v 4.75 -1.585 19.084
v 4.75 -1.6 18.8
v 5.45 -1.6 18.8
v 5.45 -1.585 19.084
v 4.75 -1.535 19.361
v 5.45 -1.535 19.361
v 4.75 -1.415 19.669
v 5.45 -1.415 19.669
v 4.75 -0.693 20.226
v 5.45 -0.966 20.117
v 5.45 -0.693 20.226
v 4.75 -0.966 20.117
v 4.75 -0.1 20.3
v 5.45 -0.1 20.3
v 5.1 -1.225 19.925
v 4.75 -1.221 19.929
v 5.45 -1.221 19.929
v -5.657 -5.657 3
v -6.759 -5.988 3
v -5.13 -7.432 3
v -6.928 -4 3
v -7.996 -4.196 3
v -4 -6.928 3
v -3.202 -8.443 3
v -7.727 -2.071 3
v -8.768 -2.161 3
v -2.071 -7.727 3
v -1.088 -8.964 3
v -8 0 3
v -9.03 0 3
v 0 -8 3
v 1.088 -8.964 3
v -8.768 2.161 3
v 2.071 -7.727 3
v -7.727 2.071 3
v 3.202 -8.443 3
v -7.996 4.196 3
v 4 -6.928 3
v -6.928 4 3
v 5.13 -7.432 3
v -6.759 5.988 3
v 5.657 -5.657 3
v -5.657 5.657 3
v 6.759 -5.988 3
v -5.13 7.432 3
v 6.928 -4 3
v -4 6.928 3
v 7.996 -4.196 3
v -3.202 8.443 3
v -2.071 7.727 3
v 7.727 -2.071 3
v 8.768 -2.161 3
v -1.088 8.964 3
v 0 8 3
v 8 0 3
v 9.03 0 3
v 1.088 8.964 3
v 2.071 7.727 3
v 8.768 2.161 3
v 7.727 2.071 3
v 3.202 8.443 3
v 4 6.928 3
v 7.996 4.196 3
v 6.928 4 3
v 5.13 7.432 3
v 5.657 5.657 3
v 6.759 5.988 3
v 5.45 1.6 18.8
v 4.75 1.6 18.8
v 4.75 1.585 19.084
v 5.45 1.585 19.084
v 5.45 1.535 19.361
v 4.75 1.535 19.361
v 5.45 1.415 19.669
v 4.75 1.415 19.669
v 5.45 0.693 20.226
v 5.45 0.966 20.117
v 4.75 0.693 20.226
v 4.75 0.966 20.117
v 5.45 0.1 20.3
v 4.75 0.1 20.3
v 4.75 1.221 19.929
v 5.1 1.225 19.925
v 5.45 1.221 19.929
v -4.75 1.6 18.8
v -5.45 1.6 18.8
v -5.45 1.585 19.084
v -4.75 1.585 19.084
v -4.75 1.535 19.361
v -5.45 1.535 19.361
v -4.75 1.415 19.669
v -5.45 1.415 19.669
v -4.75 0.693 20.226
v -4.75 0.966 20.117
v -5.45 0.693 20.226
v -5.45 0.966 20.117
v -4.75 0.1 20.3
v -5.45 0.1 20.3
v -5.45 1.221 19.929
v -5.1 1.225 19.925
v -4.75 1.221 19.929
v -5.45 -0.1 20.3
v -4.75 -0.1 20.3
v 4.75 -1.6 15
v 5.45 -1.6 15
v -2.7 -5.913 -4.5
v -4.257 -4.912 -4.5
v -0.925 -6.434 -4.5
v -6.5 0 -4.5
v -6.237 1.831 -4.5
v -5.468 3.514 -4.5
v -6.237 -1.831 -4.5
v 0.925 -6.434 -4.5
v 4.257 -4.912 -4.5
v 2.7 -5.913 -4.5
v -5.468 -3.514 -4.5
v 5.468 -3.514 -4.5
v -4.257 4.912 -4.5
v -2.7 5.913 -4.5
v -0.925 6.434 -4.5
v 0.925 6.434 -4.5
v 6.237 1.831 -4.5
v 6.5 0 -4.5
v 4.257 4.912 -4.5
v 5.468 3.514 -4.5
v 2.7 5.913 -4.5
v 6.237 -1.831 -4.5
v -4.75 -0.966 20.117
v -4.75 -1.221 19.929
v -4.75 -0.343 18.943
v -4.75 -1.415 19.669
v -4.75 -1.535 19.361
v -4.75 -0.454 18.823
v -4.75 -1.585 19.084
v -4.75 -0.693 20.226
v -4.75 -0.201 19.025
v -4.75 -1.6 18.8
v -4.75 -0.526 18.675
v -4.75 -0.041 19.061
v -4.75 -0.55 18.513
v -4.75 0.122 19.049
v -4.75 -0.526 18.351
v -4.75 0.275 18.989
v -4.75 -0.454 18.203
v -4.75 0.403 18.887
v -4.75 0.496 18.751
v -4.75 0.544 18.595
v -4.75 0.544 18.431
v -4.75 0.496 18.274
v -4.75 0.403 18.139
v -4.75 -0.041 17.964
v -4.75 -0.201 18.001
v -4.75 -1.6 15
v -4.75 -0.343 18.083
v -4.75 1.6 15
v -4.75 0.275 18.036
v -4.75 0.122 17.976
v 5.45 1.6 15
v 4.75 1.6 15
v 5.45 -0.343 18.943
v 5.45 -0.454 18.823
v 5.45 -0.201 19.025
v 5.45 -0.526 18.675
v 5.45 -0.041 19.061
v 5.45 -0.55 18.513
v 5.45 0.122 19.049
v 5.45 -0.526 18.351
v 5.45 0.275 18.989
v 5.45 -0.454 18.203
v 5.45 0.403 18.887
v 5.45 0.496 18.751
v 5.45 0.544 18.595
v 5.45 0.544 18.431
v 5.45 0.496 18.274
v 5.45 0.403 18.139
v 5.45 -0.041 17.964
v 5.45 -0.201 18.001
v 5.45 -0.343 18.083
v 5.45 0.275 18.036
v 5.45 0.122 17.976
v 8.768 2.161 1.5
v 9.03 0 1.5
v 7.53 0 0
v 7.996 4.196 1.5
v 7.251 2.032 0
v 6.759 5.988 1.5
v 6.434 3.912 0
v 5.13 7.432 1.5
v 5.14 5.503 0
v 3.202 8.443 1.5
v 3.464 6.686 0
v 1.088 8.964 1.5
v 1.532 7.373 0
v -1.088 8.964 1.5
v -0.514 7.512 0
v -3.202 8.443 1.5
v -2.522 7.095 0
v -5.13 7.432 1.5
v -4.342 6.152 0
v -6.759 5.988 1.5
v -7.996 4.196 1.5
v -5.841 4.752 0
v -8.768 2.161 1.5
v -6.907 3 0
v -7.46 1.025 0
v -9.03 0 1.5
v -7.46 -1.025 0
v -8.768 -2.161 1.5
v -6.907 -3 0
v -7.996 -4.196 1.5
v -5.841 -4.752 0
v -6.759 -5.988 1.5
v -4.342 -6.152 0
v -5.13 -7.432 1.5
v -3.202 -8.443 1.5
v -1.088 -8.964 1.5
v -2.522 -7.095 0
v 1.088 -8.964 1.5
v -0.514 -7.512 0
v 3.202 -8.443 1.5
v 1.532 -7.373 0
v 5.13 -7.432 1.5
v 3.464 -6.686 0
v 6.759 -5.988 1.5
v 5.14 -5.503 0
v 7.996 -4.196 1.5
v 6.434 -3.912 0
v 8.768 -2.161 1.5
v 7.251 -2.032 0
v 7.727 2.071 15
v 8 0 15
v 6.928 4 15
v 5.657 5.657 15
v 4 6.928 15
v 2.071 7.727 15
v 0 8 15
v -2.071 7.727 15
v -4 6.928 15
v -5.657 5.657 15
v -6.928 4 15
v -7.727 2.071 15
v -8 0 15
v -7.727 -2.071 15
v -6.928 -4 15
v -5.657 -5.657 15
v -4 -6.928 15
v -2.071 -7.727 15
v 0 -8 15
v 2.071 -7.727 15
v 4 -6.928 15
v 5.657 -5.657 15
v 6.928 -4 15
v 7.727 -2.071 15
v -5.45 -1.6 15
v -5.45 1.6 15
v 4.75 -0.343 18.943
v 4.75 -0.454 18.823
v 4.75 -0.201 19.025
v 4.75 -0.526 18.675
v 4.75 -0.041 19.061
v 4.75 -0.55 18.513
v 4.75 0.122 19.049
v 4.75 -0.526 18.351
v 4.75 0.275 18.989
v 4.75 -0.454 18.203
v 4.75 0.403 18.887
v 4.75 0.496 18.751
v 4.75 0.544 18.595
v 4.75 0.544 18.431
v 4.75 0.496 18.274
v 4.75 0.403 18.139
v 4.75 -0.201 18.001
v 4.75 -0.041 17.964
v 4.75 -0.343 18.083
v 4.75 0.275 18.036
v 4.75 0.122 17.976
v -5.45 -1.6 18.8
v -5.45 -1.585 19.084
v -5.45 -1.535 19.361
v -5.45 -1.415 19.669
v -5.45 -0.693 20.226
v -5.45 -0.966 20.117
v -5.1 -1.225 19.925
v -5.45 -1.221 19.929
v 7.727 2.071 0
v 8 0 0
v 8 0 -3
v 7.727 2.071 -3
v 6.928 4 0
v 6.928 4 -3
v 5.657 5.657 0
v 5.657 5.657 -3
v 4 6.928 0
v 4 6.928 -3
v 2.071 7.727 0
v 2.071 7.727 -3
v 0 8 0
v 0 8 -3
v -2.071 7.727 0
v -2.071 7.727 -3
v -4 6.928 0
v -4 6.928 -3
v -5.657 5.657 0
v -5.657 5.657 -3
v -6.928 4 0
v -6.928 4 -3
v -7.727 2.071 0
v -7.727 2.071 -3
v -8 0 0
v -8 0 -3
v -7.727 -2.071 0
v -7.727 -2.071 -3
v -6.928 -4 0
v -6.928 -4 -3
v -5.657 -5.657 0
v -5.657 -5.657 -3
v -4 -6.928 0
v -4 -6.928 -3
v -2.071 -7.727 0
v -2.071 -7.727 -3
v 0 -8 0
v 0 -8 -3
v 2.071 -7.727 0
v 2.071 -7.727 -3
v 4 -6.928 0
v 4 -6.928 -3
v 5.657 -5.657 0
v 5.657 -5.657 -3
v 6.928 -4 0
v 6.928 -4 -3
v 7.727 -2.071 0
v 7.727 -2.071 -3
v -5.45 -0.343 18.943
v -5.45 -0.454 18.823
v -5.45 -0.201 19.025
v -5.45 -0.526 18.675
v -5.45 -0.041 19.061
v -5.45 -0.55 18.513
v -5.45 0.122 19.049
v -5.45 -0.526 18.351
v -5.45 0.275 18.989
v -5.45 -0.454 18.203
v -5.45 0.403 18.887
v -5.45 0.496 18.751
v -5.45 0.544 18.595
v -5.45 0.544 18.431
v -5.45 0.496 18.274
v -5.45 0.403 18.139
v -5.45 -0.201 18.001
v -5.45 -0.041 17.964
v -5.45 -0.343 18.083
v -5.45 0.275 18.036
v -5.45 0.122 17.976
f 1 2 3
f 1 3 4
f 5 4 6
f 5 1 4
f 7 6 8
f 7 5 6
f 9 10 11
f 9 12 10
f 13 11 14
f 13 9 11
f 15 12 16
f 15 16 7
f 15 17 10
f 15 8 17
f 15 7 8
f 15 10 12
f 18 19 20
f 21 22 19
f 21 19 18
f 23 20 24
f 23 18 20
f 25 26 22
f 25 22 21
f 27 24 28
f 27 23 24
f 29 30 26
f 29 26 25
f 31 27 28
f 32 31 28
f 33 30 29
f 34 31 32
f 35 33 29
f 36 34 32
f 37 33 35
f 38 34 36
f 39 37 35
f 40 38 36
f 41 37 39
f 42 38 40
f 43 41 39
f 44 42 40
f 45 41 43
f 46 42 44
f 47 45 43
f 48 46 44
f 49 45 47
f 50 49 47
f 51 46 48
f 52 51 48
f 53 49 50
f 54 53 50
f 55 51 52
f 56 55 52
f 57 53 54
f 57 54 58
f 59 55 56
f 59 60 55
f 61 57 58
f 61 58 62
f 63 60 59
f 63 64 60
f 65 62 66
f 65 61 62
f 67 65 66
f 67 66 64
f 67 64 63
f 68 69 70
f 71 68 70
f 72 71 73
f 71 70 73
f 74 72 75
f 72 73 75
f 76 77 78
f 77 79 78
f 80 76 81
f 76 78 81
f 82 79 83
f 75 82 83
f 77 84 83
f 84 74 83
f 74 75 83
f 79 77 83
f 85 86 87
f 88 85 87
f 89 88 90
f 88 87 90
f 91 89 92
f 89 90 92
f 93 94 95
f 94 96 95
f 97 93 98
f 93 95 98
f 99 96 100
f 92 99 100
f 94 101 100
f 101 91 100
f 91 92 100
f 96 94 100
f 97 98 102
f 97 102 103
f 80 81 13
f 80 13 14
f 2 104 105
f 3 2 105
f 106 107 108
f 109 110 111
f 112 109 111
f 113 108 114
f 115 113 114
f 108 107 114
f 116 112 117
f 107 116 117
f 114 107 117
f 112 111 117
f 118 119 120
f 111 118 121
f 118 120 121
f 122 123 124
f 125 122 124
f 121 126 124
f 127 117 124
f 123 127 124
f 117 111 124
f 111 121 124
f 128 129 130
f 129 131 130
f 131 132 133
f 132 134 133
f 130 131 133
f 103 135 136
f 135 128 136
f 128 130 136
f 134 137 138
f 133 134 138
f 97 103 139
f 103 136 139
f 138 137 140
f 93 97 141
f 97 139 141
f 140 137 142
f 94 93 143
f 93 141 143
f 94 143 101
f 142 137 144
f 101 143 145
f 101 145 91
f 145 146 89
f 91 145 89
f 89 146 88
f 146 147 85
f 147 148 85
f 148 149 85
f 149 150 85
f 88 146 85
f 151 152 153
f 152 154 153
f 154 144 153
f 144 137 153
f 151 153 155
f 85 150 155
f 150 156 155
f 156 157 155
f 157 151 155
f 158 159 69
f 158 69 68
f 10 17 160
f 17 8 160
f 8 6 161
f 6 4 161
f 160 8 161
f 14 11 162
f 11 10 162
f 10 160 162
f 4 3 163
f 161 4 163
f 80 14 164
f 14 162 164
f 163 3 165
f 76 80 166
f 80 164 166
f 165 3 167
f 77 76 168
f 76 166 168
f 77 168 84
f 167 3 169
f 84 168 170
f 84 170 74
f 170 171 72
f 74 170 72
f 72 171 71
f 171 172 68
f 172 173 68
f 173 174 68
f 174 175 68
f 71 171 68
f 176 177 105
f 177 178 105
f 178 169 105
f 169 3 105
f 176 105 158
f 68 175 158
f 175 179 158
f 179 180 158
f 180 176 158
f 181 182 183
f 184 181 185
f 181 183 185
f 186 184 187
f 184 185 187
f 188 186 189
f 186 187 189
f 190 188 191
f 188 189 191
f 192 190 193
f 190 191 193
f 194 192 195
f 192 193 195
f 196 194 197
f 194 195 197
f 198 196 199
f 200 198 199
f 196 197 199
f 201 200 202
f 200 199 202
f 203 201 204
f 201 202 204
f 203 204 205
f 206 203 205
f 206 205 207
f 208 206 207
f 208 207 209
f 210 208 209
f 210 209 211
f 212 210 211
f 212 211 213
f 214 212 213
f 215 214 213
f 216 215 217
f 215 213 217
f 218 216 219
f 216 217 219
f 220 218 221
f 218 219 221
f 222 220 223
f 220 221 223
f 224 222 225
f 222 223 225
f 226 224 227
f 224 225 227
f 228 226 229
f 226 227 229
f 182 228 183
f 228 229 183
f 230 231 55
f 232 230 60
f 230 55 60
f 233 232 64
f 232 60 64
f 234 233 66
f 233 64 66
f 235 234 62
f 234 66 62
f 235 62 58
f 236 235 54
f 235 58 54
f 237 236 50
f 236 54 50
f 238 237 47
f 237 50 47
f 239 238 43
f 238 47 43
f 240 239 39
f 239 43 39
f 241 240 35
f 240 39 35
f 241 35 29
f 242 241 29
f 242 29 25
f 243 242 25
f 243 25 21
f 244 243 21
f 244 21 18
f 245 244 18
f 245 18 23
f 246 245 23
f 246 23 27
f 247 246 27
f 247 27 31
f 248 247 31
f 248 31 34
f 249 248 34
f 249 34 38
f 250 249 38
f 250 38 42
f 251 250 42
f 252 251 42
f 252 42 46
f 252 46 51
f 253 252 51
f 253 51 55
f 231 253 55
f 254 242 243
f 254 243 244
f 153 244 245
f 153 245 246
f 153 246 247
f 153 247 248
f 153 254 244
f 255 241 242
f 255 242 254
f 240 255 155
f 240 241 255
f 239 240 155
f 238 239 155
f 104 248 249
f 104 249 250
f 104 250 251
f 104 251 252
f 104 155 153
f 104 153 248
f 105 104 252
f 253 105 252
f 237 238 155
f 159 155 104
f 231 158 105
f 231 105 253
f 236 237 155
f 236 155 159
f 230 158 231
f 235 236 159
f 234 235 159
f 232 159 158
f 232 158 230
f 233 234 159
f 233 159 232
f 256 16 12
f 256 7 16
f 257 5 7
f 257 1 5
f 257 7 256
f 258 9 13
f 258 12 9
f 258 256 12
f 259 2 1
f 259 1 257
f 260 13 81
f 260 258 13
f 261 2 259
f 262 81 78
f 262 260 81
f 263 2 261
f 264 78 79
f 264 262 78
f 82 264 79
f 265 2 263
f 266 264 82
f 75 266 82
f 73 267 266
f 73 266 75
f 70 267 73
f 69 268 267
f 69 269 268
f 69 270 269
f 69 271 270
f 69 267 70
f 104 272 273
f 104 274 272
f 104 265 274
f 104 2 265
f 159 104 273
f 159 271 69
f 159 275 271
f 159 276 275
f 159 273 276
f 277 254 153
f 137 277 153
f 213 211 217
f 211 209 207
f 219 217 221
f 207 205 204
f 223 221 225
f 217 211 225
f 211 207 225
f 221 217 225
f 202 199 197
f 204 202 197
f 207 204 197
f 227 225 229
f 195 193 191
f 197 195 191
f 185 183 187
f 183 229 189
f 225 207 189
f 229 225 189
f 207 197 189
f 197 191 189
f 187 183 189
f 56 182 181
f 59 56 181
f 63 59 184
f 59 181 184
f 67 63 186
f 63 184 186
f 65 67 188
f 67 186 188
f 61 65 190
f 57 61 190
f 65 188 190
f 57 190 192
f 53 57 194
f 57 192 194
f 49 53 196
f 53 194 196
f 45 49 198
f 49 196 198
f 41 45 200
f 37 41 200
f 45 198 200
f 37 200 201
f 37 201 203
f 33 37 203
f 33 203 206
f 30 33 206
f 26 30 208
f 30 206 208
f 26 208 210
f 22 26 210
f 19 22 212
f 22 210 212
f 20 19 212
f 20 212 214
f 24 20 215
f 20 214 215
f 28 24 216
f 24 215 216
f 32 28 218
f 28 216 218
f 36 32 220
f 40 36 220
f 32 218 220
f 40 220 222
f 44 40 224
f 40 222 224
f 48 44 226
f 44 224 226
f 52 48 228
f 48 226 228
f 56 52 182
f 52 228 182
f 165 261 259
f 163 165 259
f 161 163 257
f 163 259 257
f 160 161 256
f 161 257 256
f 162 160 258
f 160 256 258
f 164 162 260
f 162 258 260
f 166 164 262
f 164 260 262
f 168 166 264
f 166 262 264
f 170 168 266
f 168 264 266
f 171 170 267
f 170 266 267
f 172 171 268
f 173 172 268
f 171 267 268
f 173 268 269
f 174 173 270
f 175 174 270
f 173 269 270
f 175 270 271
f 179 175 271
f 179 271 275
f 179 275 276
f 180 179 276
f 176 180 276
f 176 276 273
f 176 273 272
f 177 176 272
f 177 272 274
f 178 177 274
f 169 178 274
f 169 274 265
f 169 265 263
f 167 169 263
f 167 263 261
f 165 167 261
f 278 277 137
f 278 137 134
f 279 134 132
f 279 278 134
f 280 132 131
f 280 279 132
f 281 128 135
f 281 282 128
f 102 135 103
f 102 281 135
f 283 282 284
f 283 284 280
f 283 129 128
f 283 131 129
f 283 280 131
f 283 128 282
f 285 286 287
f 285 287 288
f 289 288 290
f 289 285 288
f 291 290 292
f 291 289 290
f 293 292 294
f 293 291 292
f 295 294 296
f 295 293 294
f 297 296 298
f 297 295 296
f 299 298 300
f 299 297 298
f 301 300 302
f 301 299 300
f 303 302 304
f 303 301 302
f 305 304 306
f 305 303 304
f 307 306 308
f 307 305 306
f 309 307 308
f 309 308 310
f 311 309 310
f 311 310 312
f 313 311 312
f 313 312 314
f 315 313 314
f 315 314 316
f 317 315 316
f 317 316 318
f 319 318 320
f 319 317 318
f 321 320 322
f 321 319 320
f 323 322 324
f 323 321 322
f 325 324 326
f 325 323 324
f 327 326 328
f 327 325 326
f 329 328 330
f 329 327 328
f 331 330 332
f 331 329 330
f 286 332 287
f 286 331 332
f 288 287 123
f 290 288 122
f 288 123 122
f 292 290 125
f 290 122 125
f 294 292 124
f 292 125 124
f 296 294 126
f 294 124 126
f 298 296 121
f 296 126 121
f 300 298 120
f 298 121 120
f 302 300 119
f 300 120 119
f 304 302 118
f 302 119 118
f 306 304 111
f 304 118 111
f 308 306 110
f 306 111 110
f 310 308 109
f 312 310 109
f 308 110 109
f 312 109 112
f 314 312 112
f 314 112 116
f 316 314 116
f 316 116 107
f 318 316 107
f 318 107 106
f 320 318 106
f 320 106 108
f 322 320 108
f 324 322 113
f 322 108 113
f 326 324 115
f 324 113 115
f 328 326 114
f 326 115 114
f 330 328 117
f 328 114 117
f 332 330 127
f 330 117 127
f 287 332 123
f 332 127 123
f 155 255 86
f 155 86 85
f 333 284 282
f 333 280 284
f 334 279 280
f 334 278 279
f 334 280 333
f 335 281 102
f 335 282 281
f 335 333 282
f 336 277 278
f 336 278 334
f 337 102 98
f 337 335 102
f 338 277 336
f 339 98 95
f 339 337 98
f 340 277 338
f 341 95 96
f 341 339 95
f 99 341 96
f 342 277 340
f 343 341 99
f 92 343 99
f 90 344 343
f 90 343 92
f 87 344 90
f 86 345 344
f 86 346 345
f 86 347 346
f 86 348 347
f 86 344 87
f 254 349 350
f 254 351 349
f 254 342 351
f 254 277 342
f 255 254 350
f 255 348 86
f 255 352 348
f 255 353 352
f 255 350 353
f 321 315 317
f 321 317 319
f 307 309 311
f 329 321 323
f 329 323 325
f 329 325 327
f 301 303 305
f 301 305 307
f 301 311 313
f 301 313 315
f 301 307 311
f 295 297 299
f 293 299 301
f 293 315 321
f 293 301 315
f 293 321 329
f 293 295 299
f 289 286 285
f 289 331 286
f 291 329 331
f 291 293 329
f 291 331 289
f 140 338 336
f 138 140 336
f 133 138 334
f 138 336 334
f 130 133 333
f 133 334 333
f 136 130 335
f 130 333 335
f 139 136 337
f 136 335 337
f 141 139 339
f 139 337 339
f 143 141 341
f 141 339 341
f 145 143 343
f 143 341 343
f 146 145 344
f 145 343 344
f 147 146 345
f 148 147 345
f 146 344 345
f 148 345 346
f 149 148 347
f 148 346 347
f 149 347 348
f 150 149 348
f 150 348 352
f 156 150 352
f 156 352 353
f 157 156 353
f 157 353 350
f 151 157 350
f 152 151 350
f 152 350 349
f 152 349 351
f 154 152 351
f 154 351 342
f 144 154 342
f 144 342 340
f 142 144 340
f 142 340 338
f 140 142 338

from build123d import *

# Parameters (mm, degrees)
F0_R        = 8
F1_DEPTH    = 15
F0_R_2      = 9.03
F2_DEPTH    = 3
F3_DEPTH    = 4.5
F4_SIZE     = 1.5
F4_2_SIZE   = 1.5
F5_W        = 0.7
F5_H        = 3.2
F6_DEPTH    = 5.3
F7_R        = 0.55
F8_DEPTH    = 25
F9_T1_DEPTH = 8.2
F9_T3_DEPTH = 8.2


# Not quite as in the source:
# - a fillet or chamfer that OpenCascade refuses, or shapes differently, is made with other operations: its cross-section is extruded or revolved along the edge and cut away or added


with BuildPart() as f1:
    # F0 (on Top) → F1 (new body)
    with BuildSketch(Plane.XY):
        Circle(F0_R)
    extrude(amount=F1_DEPTH)

    # F0 (on Top) → F2 (join)
    with BuildSketch(Plane.XY):
        Circle(F0_R_2)
        Circle(F0_R, mode=Mode.SUBTRACT)
        Circle(F0_R)
    extrude(amount=F2_DEPTH)

    # F4#2
    f4_2_edges = [f1.edges().sort_by_distance(p)[0] for p in [
        (-9.03, 0, 0),
    ]]
    chamfer(f4_2_edges, length=F4_2_SIZE)

    # F5 (on face) → F6 (join)
    with BuildSketch(Plane.XY.offset(15)):
        with Locations((-5.1, 0)):
            Rectangle(F5_W, F5_H)
        with Locations((5.1, 0)):
            Rectangle(F5_W, F5_H)
    extrude(amount=F6_DEPTH)

    # F7 (on face) → F8 (cut)
    with BuildSketch(Plane(origin=(-5.45, 0, 0), x_dir=(0, -1, 0), z_dir=(-1, 0, 0))):
        with Locations((0, 18.5127034783)):
            Circle(F7_R)
    extrude(amount=-F8_DEPTH, mode=Mode.SUBTRACT)

    # F9: fillet of radius 1.5 on 4 edges, made by hand

    # F9_s2 → F9_t1 (cut)
    with BuildSketch(Plane.YZ.offset(-9.2)):
        with BuildLine():
            add(Edge.make_bspline(
                [(-1.6, 18.8), (-1.6, 20.3), (-0.1, 20.3)],
                knots=[0, 0, 0, 1, 1, 1], degree=2, weights=[1, 1, 1]))
            Line((-0.1, 20.3), (-1.6, 20.3))
            Line((-1.6, 20.3), (-1.6, 18.8))
        make_face()
        with BuildLine():
            add(Edge.make_bspline(
                [(1.6, 18.8), (1.6, 20.3), (0.1, 20.3)],
                knots=[0, 0, 0, 1, 1, 1], degree=2, weights=[1, 1, 1]))
            Line((0.1, 20.3), (1.6, 20.3))
            Line((1.6, 20.3), (1.6, 18.8))
        make_face()
    extrude(amount=F9_T1_DEPTH, mode=Mode.SUBTRACT)

    # F9_s4 → F9_t3 (cut)
    with BuildSketch(Plane.YZ.offset(1)):
        with BuildLine():
            add(Edge.make_bspline(
                [(-1.6, 18.8), (-1.6, 20.3), (-0.1, 20.3)],
                knots=[0, 0, 0, 1, 1, 1], degree=2, weights=[1, 1, 1]))
            Line((-0.1, 20.3), (-1.6, 20.3))
            Line((-1.6, 20.3), (-1.6, 18.8))
        make_face()
        with BuildLine():
            add(Edge.make_bspline(
                [(1.6, 18.8), (1.6, 20.3), (0.1, 20.3)],
                knots=[0, 0, 0, 1, 1, 1], degree=2, weights=[1, 1, 1]))
            Line((0.1, 20.3), (1.6, 20.3))
            Line((1.6, 20.3), (1.6, 18.8))
        make_face()
    extrude(amount=F9_T3_DEPTH, mode=Mode.SUBTRACT)


with BuildPart() as f3:
    # F0 (on Top) → F3 (new body)
    with BuildSketch(Plane.XY):
        Circle(F0_R)
    extrude(amount=-F3_DEPTH)

    # F4
    f4_edges = [f3.edges().sort_by_distance(p)[0] for p in [
        (-8, 0, -4.5),
    ]]
    chamfer(f4_edges, length=F4_SIZE)


solid = Compound([f1.part, f3.part])
